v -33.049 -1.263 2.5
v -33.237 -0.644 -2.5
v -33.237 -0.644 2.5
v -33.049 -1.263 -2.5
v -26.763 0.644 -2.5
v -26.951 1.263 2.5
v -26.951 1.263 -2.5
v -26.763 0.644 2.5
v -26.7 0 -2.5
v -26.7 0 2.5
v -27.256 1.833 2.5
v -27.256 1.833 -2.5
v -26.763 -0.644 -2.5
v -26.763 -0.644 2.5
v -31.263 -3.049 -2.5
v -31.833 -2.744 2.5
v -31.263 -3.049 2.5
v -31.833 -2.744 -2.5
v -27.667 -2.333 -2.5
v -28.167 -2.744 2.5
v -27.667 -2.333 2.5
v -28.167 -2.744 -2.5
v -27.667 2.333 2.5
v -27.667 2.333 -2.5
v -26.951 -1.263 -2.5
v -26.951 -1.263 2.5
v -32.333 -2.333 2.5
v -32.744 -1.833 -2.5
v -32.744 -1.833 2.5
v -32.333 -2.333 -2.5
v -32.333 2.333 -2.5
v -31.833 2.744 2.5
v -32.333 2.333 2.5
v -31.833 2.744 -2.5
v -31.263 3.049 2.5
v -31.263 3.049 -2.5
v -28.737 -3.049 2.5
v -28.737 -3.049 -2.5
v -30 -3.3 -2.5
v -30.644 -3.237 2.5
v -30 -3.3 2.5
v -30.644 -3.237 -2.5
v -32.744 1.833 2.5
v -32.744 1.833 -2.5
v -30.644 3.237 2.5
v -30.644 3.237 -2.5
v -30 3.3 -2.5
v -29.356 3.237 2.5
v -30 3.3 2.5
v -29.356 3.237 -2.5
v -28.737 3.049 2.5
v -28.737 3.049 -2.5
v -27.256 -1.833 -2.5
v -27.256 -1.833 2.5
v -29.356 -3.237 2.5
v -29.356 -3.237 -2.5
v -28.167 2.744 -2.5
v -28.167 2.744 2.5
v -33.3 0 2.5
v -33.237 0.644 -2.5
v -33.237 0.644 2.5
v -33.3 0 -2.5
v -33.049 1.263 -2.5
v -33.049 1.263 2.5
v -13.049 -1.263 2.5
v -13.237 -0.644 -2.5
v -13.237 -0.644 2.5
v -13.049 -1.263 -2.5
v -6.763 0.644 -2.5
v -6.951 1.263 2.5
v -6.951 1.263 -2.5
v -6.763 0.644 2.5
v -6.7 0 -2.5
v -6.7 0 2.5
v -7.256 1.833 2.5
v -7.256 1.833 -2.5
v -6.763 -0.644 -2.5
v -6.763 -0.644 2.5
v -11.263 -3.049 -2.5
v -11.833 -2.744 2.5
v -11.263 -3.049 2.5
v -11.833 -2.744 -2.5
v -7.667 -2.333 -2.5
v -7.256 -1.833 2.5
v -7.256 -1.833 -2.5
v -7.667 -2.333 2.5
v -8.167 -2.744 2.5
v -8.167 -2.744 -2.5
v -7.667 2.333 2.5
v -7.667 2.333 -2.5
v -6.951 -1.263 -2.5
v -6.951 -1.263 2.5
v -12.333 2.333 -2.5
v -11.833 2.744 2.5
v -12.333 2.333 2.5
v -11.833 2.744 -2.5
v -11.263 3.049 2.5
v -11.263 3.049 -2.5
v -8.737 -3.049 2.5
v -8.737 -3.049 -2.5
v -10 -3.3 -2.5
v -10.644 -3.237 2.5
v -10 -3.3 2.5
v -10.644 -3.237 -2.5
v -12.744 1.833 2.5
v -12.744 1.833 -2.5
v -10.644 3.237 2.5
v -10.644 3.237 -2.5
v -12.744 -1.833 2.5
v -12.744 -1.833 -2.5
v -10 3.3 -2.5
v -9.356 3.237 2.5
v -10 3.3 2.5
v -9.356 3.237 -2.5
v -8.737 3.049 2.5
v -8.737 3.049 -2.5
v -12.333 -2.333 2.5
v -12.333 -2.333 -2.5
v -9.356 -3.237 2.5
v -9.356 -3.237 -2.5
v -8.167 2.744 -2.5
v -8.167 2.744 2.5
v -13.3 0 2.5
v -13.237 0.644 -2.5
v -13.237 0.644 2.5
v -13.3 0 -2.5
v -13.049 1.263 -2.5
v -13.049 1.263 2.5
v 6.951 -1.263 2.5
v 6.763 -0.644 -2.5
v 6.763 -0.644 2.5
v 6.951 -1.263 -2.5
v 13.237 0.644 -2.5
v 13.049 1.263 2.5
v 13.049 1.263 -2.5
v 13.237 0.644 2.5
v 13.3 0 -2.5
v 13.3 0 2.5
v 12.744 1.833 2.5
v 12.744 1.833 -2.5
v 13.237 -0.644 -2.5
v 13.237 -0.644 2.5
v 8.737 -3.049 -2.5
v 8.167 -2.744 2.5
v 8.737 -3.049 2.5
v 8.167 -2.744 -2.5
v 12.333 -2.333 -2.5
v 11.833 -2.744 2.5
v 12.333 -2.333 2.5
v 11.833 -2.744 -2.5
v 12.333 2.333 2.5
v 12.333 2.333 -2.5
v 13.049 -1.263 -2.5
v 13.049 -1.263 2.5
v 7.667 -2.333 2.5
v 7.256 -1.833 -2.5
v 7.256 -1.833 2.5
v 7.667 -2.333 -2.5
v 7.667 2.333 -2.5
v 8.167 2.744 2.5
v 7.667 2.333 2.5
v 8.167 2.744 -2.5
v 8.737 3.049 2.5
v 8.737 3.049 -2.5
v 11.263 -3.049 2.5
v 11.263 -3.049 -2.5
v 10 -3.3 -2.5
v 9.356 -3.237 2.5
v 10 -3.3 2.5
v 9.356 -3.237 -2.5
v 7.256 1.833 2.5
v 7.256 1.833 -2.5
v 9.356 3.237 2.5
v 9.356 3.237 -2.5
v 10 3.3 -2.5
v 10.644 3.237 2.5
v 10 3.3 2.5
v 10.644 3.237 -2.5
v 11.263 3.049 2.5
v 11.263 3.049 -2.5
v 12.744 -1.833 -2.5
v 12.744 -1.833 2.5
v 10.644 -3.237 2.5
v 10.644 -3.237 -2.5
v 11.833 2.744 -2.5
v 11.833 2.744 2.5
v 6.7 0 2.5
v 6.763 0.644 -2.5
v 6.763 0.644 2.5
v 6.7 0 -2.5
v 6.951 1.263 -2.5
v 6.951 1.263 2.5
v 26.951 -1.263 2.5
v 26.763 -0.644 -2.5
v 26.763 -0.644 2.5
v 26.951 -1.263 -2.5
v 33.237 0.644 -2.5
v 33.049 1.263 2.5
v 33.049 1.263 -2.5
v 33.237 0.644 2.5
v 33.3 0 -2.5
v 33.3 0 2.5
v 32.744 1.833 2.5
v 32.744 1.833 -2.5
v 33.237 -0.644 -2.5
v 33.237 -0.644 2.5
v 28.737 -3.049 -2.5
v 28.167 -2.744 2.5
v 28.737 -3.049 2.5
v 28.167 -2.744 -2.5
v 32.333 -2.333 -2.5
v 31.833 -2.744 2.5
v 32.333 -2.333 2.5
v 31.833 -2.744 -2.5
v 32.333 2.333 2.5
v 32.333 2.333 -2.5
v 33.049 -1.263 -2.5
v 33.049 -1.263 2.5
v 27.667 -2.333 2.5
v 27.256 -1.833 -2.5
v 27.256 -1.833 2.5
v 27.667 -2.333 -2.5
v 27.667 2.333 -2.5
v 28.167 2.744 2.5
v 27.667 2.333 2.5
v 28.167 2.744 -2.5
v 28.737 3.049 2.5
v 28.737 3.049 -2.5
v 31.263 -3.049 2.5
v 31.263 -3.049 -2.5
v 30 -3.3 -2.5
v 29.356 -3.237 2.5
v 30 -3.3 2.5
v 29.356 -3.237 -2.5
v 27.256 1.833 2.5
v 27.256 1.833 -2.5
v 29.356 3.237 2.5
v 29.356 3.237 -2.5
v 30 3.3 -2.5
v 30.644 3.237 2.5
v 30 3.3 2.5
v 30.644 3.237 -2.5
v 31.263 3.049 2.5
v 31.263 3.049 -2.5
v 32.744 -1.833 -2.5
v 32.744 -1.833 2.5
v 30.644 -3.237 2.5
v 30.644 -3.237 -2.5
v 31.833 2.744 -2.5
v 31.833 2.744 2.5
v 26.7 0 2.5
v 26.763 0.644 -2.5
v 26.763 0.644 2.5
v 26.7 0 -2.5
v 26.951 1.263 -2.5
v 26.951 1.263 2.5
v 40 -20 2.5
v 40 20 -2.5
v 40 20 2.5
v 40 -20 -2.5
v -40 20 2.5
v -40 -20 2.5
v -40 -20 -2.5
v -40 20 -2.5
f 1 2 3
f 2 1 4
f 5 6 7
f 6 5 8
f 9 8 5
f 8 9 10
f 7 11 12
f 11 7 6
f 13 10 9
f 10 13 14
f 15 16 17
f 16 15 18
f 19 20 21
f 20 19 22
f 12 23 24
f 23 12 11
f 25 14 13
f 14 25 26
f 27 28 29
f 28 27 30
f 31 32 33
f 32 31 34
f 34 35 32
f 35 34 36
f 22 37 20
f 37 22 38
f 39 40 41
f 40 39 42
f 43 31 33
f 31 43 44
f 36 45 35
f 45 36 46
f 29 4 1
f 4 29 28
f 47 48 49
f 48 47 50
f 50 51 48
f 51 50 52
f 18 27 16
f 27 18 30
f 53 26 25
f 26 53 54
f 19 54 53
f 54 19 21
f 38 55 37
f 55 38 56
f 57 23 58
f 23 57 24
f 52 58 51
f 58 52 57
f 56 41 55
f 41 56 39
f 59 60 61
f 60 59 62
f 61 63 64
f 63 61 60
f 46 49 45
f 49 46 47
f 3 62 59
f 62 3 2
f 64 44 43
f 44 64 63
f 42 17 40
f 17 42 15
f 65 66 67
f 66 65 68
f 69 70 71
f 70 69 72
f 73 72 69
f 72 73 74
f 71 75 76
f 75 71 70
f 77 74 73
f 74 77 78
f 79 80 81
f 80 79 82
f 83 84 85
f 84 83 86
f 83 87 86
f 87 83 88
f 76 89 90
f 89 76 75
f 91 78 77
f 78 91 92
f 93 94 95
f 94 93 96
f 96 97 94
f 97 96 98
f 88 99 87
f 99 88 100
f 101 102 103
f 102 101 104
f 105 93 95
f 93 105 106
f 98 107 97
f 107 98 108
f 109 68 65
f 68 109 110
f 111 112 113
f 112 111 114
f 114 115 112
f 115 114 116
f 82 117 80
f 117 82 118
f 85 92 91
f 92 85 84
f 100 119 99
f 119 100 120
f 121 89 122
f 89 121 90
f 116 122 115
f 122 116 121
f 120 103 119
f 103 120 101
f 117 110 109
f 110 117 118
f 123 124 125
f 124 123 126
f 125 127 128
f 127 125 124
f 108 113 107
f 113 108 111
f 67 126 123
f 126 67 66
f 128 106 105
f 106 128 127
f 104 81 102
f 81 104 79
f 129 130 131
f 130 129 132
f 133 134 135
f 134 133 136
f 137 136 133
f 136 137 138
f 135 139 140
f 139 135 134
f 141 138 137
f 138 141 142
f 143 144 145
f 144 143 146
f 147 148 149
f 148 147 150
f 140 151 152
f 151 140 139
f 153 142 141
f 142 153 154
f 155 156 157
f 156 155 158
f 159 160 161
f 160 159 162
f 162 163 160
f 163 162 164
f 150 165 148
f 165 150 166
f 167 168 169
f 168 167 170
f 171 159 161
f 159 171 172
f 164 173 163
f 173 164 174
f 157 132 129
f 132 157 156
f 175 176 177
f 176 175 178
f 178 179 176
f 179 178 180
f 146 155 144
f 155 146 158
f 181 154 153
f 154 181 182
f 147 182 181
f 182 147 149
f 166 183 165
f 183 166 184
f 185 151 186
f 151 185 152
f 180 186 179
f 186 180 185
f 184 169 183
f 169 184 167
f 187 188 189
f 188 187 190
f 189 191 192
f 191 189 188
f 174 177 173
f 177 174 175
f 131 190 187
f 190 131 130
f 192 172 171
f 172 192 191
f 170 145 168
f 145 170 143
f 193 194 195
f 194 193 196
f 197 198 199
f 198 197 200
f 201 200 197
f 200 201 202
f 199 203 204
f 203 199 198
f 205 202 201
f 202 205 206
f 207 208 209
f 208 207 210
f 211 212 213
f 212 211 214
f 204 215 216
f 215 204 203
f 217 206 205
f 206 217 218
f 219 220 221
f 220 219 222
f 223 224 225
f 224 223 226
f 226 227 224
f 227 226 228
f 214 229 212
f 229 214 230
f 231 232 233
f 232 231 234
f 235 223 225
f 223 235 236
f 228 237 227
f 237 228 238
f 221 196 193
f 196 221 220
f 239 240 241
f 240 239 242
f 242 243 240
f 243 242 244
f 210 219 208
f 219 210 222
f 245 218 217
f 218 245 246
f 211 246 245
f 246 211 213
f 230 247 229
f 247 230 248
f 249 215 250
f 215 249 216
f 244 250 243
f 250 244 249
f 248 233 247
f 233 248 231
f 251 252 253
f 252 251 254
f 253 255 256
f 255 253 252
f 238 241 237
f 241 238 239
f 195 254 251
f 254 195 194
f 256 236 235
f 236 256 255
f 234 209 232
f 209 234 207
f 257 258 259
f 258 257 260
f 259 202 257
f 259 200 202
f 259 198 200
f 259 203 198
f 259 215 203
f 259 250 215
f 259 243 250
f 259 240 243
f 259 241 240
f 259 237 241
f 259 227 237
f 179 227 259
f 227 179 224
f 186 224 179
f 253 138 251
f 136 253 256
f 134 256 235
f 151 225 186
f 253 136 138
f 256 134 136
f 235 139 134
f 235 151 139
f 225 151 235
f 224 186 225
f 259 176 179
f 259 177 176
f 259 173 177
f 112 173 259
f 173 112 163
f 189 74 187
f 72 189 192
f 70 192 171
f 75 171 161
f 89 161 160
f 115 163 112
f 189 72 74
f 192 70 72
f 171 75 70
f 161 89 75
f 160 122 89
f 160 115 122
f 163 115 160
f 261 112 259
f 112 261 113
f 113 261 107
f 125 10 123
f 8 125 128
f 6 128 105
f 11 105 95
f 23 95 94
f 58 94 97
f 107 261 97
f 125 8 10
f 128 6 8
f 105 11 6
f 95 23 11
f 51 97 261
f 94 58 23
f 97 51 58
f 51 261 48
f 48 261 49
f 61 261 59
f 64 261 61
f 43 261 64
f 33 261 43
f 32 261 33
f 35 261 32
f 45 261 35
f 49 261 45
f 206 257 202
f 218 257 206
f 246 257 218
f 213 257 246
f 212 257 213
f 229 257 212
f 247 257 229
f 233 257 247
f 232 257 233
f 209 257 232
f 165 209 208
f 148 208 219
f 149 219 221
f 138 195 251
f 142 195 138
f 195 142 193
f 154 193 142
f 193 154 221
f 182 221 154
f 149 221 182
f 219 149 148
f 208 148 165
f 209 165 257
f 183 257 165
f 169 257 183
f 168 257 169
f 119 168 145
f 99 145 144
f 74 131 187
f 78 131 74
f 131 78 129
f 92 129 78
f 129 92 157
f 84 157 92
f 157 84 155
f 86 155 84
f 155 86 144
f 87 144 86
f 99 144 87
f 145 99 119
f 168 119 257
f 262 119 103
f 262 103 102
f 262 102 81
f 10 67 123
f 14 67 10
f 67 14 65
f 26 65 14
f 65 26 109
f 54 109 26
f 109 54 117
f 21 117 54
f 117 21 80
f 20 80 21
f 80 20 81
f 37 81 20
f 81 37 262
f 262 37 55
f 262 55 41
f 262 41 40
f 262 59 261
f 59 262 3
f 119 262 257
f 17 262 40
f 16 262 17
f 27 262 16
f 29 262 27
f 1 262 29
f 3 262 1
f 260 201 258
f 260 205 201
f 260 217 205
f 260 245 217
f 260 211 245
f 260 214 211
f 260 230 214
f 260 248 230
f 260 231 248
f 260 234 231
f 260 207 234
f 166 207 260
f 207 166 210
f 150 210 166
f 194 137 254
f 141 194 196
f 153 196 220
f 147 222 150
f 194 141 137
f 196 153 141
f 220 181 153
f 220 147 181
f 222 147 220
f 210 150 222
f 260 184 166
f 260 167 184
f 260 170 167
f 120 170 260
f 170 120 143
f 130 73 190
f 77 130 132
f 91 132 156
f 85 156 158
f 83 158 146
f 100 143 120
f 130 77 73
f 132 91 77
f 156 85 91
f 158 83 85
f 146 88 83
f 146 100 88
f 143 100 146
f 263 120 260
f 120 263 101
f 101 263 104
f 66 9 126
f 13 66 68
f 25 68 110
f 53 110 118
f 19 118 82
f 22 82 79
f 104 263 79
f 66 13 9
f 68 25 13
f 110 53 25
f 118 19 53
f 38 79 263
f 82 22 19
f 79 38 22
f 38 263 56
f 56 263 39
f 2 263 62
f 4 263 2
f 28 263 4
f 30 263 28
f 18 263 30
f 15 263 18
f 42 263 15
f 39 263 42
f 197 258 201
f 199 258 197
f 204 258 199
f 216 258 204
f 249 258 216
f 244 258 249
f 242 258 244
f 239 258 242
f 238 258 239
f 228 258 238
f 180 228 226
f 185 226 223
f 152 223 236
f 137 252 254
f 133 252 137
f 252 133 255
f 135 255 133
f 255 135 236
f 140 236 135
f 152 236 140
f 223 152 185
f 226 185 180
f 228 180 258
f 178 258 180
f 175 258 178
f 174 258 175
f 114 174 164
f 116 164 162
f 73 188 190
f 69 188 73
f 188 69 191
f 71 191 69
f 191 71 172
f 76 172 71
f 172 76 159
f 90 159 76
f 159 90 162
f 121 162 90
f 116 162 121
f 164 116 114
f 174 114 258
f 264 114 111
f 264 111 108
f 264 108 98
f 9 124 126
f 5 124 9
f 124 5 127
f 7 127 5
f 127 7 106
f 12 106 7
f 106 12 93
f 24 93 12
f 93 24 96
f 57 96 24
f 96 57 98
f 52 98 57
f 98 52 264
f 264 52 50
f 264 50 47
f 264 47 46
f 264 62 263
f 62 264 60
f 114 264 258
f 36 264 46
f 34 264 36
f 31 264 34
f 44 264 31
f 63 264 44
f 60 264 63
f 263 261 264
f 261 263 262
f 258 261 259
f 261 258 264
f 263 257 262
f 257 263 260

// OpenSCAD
$fn = 32;

// ----------------------------------------------------------------------
// Hole bar, 4 x Ø6.6
// row layout, 10 mm edge offset
// ----------------------------------------------------------------------

// --- parameters (mm) ---
bar_w = 40;    // bar width (Y)
bar_t = 5;     // bar thickness (Z)
holes = 4;     // holes per row
hole_d = 6.6;  // hole diameter
edge = 10;     // offset from the bar end to the first hole
pitch = 20;    // pitch between neighbouring holes

// --- derived feature positions (mm) ---
span = (holes - 1) * pitch;   // = 60   distance between the end holes
bar_l = span + 2 * edge;      // = 80   overall bar length
start_x = -bar_l / 2 + edge;  // = -30   X of the first hole
feature_centers = [
  [start_x + 0 * pitch, 0],
  [start_x + 1 * pitch, 0],
  [start_x + 2 * pitch, 0],
  [start_x + 3 * pitch, 0]
];   // hole centres of the first row

// bar with one row of holes, drilled from feature_centers
difference() {
  translate([-bar_l / 2, -bar_w / 2, -bar_t / 2]) cube([bar_l, bar_w, bar_t]);
  for (centre = feature_centers)
    translate([centre[0], centre[1], 0])
      cylinder(d = hole_d, h = bar_t + 2, center = true);
}
